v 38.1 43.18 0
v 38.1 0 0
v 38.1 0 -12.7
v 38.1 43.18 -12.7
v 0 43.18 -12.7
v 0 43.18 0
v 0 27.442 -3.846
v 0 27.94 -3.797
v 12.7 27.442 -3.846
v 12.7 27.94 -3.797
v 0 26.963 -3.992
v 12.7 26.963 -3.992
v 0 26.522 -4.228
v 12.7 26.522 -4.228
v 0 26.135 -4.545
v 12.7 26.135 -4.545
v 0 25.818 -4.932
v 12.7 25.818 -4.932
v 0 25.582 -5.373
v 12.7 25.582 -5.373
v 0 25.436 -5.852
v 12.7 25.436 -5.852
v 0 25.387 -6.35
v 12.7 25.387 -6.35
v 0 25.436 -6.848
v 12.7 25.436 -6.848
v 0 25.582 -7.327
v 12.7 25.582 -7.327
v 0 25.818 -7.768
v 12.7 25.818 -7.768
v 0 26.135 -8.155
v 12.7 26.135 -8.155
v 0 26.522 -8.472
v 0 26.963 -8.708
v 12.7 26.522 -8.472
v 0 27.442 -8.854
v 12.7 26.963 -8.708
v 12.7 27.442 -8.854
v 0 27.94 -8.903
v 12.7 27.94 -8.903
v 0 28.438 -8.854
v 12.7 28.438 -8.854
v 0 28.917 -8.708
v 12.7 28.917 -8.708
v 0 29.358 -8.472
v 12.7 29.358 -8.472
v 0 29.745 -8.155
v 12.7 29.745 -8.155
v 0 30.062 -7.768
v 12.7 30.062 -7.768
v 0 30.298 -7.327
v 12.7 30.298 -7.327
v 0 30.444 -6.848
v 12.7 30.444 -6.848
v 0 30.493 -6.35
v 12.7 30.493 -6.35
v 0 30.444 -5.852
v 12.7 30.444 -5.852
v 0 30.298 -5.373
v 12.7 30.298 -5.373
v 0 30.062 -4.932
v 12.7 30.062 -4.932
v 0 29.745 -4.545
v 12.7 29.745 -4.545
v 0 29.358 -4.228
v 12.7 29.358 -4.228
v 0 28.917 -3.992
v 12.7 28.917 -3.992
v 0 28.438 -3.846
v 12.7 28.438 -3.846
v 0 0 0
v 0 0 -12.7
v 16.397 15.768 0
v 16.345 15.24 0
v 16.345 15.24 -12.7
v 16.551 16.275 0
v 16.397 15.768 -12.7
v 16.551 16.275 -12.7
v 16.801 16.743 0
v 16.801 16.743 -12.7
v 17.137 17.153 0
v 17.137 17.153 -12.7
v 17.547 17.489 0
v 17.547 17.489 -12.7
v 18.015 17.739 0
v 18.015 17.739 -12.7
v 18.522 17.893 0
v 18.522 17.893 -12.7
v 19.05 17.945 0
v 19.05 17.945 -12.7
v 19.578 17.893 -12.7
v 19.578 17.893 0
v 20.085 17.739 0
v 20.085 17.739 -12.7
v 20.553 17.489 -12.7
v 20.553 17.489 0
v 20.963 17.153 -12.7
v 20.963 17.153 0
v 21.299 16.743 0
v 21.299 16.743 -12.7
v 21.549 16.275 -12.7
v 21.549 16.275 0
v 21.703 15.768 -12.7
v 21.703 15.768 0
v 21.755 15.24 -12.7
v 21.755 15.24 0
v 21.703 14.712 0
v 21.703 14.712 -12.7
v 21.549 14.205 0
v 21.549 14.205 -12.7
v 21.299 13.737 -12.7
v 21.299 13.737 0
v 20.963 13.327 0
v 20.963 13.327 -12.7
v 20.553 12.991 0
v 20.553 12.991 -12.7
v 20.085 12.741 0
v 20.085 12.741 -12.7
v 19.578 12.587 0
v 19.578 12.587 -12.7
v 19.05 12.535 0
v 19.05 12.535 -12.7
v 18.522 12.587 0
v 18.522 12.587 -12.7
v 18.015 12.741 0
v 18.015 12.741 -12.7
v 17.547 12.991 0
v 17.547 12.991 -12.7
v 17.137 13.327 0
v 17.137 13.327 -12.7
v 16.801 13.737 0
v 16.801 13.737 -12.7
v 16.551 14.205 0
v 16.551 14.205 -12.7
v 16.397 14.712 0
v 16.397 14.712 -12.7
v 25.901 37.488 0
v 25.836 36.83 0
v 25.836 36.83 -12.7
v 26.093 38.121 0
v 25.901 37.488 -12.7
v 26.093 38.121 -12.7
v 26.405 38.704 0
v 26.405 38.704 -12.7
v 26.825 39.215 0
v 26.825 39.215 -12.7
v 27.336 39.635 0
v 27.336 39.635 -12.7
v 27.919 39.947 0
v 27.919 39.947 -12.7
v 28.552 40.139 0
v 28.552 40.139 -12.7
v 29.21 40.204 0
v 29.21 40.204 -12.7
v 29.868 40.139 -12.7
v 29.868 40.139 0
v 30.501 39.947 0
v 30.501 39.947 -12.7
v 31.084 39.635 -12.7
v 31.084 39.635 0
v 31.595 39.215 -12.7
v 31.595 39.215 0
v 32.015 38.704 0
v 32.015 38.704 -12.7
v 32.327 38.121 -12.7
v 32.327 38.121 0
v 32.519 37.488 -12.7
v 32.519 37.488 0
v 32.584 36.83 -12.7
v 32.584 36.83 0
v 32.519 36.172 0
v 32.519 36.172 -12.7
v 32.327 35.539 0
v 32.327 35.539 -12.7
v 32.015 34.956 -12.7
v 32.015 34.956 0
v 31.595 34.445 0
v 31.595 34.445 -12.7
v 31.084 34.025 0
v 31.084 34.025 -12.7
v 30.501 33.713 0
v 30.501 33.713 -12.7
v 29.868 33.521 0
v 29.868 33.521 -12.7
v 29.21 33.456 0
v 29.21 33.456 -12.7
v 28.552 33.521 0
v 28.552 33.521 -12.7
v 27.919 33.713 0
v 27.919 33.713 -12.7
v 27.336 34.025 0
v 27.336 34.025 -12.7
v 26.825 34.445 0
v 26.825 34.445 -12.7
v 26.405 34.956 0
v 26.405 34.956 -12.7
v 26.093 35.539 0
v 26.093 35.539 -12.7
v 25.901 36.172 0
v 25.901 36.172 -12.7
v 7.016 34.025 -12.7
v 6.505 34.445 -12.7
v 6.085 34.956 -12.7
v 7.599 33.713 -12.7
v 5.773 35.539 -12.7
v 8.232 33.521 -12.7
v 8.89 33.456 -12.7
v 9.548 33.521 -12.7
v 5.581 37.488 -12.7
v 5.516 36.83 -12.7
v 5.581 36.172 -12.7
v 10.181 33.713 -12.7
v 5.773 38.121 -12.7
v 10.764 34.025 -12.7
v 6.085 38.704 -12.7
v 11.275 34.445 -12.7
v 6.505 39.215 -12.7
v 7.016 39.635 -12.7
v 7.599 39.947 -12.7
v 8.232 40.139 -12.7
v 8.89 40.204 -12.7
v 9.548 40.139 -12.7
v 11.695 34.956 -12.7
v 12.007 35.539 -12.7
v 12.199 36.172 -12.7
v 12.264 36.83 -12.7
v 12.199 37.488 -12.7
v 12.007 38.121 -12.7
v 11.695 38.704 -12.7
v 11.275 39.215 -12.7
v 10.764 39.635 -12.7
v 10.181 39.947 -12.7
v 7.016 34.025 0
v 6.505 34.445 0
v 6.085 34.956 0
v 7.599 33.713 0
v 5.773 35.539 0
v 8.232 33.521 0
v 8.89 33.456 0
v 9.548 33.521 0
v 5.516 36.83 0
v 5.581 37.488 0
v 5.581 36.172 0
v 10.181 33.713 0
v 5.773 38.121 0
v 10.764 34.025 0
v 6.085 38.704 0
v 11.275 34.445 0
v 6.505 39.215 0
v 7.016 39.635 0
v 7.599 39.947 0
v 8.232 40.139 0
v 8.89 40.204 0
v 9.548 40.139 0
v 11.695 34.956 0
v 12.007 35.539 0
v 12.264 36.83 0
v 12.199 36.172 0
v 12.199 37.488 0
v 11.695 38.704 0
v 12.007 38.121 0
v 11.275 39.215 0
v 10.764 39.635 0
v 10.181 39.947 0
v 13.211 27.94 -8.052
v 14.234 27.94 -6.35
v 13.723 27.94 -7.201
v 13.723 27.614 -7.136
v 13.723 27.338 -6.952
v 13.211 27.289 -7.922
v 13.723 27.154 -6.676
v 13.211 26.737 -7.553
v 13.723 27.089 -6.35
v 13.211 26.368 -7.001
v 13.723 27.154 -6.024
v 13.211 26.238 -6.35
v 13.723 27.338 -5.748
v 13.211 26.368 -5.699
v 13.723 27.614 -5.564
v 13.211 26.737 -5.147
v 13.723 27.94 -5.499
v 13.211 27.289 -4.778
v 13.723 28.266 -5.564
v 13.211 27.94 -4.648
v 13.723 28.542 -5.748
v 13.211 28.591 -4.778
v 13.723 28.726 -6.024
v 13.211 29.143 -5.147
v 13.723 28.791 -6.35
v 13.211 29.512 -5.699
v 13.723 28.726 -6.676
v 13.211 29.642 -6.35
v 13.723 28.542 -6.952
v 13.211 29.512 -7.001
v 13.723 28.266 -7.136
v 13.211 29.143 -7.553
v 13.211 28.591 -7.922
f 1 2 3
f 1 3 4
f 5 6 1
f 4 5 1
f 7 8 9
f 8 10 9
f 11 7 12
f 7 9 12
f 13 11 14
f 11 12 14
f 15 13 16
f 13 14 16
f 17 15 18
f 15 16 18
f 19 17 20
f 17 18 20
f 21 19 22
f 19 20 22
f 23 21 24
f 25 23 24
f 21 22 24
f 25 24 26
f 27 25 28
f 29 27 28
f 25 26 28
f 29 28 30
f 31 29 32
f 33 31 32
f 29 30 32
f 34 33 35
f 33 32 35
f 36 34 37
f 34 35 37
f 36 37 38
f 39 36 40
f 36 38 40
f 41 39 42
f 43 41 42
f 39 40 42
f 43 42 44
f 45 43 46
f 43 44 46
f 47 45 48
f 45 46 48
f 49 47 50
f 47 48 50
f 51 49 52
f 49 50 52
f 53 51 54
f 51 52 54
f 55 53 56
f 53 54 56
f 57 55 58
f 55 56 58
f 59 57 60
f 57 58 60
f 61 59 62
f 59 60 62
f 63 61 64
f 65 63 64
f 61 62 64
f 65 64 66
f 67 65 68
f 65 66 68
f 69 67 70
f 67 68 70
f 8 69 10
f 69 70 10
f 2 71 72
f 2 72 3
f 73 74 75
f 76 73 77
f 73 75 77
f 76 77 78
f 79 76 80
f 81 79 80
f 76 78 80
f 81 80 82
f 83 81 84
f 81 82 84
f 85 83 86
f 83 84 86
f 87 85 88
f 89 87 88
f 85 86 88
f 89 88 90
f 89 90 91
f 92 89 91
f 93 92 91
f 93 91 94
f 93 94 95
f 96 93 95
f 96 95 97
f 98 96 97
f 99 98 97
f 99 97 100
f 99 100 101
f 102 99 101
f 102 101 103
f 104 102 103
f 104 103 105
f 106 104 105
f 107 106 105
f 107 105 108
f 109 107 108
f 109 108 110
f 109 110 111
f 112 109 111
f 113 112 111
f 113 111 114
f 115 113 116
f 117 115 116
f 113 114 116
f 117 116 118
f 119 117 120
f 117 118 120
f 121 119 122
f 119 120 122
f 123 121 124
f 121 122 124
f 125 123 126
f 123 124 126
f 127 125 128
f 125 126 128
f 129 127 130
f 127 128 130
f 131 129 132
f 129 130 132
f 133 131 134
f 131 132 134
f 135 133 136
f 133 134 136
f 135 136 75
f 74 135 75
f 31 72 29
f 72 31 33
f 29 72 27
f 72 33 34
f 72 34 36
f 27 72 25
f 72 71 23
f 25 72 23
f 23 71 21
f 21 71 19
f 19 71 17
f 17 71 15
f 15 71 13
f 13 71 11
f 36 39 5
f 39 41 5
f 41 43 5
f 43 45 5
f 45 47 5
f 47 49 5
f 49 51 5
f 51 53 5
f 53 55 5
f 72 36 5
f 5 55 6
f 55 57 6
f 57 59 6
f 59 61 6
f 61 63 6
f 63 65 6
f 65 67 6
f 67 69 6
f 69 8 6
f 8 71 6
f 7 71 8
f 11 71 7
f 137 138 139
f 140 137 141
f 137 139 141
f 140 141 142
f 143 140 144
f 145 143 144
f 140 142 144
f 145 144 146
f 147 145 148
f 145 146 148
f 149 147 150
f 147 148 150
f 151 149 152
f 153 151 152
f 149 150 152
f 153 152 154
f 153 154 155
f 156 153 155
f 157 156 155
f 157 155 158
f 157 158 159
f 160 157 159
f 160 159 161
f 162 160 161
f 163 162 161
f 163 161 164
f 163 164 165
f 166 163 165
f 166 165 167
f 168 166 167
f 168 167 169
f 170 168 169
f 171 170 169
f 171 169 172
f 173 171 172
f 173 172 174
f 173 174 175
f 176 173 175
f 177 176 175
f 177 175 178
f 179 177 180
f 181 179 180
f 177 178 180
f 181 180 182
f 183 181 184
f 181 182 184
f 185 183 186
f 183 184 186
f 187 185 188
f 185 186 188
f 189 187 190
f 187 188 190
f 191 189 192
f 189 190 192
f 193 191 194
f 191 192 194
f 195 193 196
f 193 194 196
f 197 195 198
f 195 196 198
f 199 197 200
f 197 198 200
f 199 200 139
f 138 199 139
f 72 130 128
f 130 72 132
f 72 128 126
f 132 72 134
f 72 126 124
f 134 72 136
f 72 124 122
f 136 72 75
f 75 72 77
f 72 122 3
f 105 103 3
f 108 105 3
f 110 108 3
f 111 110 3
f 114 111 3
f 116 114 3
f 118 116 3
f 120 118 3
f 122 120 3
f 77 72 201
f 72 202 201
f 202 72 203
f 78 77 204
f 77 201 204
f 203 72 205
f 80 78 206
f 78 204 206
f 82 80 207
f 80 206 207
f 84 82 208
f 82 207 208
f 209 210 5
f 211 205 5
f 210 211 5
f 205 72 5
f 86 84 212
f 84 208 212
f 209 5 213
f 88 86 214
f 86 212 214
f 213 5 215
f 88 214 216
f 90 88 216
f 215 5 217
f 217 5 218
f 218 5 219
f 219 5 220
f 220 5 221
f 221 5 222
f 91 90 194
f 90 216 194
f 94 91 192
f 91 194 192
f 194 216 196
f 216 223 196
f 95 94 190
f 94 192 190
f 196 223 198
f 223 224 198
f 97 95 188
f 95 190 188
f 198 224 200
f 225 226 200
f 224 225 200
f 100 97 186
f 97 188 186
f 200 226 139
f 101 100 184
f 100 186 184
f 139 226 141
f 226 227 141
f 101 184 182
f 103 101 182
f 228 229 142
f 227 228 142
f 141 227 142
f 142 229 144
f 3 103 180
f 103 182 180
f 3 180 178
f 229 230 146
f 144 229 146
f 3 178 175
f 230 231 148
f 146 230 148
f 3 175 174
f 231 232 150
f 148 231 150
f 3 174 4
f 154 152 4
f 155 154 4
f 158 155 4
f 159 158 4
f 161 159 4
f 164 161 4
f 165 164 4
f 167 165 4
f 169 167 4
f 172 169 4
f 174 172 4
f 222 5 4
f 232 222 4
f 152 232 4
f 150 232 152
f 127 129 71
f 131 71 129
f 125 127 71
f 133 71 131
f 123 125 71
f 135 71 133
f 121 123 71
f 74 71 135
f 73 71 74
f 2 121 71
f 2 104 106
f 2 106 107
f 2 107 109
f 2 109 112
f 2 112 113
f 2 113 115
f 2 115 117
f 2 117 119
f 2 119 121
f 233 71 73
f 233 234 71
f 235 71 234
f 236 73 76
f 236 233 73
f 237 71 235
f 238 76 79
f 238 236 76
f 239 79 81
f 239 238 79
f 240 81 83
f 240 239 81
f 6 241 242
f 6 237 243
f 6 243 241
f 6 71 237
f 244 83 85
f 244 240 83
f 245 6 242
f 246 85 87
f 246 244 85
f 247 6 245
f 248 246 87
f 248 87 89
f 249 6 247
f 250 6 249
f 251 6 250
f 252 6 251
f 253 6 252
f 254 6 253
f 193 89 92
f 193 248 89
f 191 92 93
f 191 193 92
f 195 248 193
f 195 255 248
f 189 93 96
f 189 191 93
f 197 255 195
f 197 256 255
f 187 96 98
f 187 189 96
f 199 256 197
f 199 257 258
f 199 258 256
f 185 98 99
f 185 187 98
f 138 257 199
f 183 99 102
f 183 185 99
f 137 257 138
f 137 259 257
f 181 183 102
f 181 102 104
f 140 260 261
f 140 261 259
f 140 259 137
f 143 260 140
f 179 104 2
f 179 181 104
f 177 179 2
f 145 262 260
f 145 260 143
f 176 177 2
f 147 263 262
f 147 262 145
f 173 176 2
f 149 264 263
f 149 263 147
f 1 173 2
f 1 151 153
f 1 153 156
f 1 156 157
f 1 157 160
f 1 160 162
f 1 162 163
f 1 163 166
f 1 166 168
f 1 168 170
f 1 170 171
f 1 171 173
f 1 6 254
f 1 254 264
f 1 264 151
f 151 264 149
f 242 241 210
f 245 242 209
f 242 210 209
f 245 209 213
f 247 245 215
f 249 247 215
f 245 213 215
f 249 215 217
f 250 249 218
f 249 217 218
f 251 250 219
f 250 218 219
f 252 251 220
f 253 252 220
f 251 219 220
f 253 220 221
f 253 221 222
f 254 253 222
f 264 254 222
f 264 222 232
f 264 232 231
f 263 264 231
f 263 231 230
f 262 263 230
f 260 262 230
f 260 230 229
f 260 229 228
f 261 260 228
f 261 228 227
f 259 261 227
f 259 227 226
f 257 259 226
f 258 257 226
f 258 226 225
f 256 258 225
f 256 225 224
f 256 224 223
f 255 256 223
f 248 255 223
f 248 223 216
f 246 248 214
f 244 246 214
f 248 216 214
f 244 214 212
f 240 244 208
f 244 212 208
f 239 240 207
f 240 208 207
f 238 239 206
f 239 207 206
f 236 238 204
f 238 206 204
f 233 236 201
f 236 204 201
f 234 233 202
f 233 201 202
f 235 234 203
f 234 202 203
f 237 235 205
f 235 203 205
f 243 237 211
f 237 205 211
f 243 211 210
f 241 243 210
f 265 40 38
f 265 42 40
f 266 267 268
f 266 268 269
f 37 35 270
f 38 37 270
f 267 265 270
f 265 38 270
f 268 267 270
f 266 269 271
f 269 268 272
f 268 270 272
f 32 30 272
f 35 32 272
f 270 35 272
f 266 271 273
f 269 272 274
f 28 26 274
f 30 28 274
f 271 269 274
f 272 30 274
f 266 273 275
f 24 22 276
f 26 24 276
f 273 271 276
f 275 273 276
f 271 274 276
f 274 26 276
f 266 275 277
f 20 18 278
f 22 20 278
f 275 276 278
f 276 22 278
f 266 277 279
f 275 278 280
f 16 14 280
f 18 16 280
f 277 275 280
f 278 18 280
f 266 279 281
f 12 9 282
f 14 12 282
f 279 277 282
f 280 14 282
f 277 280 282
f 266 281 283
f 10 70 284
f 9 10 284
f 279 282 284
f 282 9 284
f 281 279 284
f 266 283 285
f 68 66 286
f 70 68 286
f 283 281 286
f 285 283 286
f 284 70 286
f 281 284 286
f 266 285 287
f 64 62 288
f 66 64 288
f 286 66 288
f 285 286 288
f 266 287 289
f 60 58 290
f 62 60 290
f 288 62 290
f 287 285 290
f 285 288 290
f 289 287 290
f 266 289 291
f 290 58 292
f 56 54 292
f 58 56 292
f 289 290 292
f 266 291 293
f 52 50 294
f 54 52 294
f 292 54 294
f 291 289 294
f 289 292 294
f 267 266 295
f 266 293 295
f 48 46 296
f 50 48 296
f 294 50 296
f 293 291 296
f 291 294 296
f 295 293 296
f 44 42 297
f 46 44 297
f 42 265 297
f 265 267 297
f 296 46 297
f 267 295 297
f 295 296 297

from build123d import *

# Parameters (mm, degrees)
SKETCH1_W                        = 38.1
SKETCH1_H                        = 43.18
BOSS_EXTRUDE1_DEPTH              = 12.7
F_17_64_0_26563_DIAMETER_HOLE1_D = 6.747002
F_1_4_20_TAPPED_HOLE2_D          = 5.1054
F_1_4_20_TAPPED_HOLE2_DEPTH      = 12.7
F_1_4_20_TAPPED_HOLE2_TIP        = 1.533816902
F_1_4_28_TAPPED_HOLE1_D          = 5.4102


with BuildPart() as part:
    # Sketch1 → Boss-Extrude1 (new body)
    with BuildSketch(Plane.XY):
        with Locations((19.05, 21.59)):
            Rectangle(SKETCH1_W, SKETCH1_H)
    extrude(amount=-BOSS_EXTRUDE1_DEPTH)

    # 17/64 (0.26563) Diameter Hole1 (through all)
    with Locations(Plane(origin=(29.21, 36.83, 0), x_dir=(1, 0, 0), z_dir=(0, 0, 1))):
        with Locations((0, 0), (-20.32, 0)):
            Hole(F_17_64_0_26563_DIAMETER_HOLE1_D / 2)

    # 1/4-20 Tapped Hole2
    with Locations(Plane(origin=(0, 27.94, -6.35), x_dir=(0, 0, -1), z_dir=(-1, 0, 0))):
        with Locations((0, 0)):
            Hole(F_1_4_20_TAPPED_HOLE2_D / 2, depth=F_1_4_20_TAPPED_HOLE2_DEPTH)
            with Locations((0, 0, -(F_1_4_20_TAPPED_HOLE2_DEPTH + F_1_4_20_TAPPED_HOLE2_TIP / 2))):  # 118° drill point
                Cone(0, F_1_4_20_TAPPED_HOLE2_D / 2, F_1_4_20_TAPPED_HOLE2_TIP, mode=Mode.SUBTRACT)

    # 1/4-28 Tapped Hole1 (through all)
    with Locations(Plane(origin=(19.05, 15.24, 0), x_dir=(1, 0, 0), z_dir=(0, 0, 1))):
        with Locations((0, 0)):
            Hole(F_1_4_28_TAPPED_HOLE1_D / 2)


solid = part.part
